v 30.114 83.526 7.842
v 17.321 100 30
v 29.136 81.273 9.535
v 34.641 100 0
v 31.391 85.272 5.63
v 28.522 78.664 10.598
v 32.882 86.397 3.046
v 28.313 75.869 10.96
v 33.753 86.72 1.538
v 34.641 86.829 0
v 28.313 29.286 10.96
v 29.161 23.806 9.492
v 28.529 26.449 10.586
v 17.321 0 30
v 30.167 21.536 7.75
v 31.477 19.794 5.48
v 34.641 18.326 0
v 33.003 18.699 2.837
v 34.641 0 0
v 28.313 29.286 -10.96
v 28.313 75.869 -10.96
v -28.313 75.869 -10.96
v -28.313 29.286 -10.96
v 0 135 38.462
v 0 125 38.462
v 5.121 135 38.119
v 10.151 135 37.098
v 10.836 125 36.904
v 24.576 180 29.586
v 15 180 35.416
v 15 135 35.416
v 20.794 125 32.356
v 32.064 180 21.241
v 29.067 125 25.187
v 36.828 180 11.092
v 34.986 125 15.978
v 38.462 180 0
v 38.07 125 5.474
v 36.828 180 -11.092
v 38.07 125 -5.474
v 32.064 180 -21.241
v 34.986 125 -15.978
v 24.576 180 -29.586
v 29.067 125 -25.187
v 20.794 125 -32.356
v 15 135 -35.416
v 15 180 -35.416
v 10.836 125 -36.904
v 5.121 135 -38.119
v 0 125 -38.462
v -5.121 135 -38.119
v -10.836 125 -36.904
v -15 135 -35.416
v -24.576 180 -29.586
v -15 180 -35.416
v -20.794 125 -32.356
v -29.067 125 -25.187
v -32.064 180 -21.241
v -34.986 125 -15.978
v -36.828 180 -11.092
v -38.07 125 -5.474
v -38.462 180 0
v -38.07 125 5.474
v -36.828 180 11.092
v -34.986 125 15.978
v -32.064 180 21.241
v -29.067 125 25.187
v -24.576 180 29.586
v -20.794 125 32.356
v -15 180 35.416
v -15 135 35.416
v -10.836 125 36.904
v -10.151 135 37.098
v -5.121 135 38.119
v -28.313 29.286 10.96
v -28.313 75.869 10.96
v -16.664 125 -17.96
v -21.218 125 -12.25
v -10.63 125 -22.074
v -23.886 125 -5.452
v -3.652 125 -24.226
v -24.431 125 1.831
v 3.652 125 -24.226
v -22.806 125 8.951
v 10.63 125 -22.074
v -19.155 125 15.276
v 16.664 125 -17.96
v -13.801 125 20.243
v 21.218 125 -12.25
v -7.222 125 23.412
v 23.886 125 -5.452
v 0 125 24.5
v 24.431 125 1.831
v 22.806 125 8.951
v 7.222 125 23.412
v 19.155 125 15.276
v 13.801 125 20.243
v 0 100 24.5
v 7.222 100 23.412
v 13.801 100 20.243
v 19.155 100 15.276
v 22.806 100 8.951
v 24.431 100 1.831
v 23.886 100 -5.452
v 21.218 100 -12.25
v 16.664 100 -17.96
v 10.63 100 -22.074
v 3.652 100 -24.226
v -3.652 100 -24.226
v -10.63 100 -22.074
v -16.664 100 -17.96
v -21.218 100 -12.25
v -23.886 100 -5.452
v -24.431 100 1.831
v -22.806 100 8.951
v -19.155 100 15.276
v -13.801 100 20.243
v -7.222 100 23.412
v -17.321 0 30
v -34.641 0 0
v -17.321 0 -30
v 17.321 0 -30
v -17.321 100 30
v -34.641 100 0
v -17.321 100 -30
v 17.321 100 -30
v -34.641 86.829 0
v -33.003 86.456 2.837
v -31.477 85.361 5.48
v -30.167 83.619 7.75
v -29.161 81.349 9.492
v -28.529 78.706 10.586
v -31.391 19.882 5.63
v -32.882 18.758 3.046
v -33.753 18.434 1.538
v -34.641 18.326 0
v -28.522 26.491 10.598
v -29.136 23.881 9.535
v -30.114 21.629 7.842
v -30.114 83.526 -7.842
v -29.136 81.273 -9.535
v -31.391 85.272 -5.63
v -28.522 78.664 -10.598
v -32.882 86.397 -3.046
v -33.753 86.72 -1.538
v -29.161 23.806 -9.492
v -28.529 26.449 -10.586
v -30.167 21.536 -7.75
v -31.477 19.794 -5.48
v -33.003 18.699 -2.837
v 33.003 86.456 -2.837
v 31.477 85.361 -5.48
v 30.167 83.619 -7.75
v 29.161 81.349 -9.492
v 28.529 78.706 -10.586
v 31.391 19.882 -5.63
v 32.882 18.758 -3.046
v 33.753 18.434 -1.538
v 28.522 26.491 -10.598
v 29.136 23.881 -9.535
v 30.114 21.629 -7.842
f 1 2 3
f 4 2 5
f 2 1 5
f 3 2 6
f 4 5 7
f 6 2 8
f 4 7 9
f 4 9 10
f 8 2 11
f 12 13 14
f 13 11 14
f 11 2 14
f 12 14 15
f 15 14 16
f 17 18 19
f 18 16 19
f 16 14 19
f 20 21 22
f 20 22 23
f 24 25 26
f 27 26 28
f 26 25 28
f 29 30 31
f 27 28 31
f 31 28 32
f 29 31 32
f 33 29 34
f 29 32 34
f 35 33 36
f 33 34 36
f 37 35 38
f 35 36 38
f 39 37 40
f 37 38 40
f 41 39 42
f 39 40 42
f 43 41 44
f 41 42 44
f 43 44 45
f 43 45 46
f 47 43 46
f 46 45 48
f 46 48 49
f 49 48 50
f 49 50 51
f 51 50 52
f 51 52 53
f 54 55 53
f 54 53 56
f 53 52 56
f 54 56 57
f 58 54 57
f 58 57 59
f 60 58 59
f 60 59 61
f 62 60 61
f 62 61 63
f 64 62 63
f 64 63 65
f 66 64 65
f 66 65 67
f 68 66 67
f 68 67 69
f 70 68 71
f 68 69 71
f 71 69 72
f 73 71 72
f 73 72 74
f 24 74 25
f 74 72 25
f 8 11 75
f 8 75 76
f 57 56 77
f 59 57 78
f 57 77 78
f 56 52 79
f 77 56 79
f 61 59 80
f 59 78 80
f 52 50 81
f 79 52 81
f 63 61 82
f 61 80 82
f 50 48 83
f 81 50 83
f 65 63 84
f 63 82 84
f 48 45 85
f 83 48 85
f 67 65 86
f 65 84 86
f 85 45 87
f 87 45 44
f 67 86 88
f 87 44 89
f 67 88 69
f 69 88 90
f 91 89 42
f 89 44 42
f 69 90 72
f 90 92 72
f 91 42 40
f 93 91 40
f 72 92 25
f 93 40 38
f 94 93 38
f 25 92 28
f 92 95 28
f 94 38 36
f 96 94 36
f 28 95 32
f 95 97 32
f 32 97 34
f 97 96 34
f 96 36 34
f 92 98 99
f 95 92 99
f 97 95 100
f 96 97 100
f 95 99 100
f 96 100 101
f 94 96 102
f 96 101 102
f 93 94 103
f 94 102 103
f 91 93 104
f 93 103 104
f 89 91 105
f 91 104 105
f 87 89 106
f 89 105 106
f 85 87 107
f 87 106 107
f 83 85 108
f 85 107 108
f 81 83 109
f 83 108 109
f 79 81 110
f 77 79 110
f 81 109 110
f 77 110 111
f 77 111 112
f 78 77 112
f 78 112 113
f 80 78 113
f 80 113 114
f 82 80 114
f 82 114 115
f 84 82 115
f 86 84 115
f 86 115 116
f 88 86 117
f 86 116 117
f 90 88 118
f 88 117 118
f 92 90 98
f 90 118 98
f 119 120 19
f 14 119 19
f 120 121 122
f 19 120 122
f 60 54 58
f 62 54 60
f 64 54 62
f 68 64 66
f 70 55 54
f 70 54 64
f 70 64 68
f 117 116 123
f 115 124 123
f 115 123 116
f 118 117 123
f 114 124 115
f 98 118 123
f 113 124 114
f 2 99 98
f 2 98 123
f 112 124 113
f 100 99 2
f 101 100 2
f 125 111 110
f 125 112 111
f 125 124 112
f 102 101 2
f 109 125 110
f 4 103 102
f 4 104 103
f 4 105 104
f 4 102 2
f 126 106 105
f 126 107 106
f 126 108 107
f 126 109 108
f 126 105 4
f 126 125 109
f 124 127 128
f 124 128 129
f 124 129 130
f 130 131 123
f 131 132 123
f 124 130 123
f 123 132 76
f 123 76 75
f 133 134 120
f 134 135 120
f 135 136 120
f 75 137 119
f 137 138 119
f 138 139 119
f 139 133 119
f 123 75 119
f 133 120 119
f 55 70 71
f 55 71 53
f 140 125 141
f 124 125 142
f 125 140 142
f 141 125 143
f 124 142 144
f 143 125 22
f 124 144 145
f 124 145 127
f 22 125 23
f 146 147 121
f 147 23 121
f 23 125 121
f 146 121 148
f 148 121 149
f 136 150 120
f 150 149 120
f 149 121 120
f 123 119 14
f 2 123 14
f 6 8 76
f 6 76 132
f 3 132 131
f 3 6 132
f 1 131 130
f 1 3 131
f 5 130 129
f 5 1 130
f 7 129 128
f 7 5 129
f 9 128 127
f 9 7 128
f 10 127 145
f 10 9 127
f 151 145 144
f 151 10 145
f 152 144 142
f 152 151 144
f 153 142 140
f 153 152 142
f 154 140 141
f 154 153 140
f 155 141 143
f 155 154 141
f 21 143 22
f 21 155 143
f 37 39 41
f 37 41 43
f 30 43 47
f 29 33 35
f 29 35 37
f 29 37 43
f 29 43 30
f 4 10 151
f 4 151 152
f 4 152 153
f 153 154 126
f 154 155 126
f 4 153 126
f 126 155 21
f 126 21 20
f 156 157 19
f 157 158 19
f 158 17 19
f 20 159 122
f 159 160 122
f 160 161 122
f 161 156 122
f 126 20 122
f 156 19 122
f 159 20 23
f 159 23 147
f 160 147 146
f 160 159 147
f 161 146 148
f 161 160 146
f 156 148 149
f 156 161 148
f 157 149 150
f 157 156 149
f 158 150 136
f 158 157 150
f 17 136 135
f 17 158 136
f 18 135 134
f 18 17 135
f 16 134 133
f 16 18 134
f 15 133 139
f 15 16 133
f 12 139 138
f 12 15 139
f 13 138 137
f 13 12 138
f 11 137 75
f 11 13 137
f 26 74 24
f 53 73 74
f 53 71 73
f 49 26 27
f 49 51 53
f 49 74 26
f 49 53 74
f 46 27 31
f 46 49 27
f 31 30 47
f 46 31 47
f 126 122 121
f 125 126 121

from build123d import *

# Parameters (mm, degrees)
BOSS_EXTRUDE1_DEPTH = 100
SKETCH5_R           = 24.5
BOSS_EXTRUDE3_DEPTH = 25
SKETCH7_R           = 38.461674467
BOSS_EXTRUDE4_DEPTH = 55
SKETCH8_W           = 30
SKETCH8_H           = 78.949061688
CUT_EXTRUDE1_DEPTH  = 45
CUT_EXTRUDE2_DEPTH  = 42.5


with BuildPart() as part:
    # Sketch4 → Boss-Extrude1 (new body)
    with BuildSketch(Plane(origin=(0, 0, 0), x_dir=(1, 0, 0), z_dir=(0, 1, 0))):
        Polygon((34.641016151, 0), (17.320508076, 30), (-17.320508076, 30), (-34.641016151, 0), (-17.320508076, -30), (17.320508076, -30), align=None)
    extrude(amount=BOSS_EXTRUDE1_DEPTH)

    # Sketch5 → Boss-Extrude3 (add)
    with BuildSketch(Plane(origin=(0, 100, 0), x_dir=(1, 0, 0), z_dir=(0, 1, 0))):
        with Locations(Location((0, 0, 0), (0, 0, 270))):
            Circle(SKETCH5_R)
    extrude(amount=BOSS_EXTRUDE3_DEPTH)

    # Sketch7 → Boss-Extrude4 (add)
    with BuildSketch(Plane(origin=(0, 125, 0), x_dir=(1, 0, 0), z_dir=(0, 1, 0))):
        with Locations(Location((0, 0, 0), (0, 0, 270))):
            Circle(SKETCH7_R)
    extrude(amount=BOSS_EXTRUDE4_DEPTH)

    # Sketch8 → Cut-Extrude1 (cut)
    with BuildSketch(Plane(origin=(0, 180, 0), x_dir=(1, 0, 0), z_dir=(0, 1, 0))):
        Rectangle(SKETCH8_W, SKETCH8_H)
    extrude(amount=-CUT_EXTRUDE1_DEPTH, mode=Mode.SUBTRACT)

    # Sketch9 → Cut-Extrude2 (cut, symmetric)
    with BuildSketch(Plane(origin=(0, 0, 0), x_dir=(0, 0, -1), z_dir=(1, 0, 0))):
        with BuildLine():
            Line((10.959896638, 75.869076848), (10.959896638, 29.285757766))
            ThreePointArc((10.959896638, 29.285757766), (0, 18.325861128), (-10.959896638, 29.285757766))
            Line((-10.959896638, 29.285757766), (-10.959896638, 75.869076848))
            ThreePointArc((-10.959896638, 75.869076848), (0, 86.828973486), (10.959896638, 75.869076848))
        make_face()
    extrude(amount=CUT_EXTRUDE2_DEPTH, both=True, mode=Mode.SUBTRACT)


solid = part.part
